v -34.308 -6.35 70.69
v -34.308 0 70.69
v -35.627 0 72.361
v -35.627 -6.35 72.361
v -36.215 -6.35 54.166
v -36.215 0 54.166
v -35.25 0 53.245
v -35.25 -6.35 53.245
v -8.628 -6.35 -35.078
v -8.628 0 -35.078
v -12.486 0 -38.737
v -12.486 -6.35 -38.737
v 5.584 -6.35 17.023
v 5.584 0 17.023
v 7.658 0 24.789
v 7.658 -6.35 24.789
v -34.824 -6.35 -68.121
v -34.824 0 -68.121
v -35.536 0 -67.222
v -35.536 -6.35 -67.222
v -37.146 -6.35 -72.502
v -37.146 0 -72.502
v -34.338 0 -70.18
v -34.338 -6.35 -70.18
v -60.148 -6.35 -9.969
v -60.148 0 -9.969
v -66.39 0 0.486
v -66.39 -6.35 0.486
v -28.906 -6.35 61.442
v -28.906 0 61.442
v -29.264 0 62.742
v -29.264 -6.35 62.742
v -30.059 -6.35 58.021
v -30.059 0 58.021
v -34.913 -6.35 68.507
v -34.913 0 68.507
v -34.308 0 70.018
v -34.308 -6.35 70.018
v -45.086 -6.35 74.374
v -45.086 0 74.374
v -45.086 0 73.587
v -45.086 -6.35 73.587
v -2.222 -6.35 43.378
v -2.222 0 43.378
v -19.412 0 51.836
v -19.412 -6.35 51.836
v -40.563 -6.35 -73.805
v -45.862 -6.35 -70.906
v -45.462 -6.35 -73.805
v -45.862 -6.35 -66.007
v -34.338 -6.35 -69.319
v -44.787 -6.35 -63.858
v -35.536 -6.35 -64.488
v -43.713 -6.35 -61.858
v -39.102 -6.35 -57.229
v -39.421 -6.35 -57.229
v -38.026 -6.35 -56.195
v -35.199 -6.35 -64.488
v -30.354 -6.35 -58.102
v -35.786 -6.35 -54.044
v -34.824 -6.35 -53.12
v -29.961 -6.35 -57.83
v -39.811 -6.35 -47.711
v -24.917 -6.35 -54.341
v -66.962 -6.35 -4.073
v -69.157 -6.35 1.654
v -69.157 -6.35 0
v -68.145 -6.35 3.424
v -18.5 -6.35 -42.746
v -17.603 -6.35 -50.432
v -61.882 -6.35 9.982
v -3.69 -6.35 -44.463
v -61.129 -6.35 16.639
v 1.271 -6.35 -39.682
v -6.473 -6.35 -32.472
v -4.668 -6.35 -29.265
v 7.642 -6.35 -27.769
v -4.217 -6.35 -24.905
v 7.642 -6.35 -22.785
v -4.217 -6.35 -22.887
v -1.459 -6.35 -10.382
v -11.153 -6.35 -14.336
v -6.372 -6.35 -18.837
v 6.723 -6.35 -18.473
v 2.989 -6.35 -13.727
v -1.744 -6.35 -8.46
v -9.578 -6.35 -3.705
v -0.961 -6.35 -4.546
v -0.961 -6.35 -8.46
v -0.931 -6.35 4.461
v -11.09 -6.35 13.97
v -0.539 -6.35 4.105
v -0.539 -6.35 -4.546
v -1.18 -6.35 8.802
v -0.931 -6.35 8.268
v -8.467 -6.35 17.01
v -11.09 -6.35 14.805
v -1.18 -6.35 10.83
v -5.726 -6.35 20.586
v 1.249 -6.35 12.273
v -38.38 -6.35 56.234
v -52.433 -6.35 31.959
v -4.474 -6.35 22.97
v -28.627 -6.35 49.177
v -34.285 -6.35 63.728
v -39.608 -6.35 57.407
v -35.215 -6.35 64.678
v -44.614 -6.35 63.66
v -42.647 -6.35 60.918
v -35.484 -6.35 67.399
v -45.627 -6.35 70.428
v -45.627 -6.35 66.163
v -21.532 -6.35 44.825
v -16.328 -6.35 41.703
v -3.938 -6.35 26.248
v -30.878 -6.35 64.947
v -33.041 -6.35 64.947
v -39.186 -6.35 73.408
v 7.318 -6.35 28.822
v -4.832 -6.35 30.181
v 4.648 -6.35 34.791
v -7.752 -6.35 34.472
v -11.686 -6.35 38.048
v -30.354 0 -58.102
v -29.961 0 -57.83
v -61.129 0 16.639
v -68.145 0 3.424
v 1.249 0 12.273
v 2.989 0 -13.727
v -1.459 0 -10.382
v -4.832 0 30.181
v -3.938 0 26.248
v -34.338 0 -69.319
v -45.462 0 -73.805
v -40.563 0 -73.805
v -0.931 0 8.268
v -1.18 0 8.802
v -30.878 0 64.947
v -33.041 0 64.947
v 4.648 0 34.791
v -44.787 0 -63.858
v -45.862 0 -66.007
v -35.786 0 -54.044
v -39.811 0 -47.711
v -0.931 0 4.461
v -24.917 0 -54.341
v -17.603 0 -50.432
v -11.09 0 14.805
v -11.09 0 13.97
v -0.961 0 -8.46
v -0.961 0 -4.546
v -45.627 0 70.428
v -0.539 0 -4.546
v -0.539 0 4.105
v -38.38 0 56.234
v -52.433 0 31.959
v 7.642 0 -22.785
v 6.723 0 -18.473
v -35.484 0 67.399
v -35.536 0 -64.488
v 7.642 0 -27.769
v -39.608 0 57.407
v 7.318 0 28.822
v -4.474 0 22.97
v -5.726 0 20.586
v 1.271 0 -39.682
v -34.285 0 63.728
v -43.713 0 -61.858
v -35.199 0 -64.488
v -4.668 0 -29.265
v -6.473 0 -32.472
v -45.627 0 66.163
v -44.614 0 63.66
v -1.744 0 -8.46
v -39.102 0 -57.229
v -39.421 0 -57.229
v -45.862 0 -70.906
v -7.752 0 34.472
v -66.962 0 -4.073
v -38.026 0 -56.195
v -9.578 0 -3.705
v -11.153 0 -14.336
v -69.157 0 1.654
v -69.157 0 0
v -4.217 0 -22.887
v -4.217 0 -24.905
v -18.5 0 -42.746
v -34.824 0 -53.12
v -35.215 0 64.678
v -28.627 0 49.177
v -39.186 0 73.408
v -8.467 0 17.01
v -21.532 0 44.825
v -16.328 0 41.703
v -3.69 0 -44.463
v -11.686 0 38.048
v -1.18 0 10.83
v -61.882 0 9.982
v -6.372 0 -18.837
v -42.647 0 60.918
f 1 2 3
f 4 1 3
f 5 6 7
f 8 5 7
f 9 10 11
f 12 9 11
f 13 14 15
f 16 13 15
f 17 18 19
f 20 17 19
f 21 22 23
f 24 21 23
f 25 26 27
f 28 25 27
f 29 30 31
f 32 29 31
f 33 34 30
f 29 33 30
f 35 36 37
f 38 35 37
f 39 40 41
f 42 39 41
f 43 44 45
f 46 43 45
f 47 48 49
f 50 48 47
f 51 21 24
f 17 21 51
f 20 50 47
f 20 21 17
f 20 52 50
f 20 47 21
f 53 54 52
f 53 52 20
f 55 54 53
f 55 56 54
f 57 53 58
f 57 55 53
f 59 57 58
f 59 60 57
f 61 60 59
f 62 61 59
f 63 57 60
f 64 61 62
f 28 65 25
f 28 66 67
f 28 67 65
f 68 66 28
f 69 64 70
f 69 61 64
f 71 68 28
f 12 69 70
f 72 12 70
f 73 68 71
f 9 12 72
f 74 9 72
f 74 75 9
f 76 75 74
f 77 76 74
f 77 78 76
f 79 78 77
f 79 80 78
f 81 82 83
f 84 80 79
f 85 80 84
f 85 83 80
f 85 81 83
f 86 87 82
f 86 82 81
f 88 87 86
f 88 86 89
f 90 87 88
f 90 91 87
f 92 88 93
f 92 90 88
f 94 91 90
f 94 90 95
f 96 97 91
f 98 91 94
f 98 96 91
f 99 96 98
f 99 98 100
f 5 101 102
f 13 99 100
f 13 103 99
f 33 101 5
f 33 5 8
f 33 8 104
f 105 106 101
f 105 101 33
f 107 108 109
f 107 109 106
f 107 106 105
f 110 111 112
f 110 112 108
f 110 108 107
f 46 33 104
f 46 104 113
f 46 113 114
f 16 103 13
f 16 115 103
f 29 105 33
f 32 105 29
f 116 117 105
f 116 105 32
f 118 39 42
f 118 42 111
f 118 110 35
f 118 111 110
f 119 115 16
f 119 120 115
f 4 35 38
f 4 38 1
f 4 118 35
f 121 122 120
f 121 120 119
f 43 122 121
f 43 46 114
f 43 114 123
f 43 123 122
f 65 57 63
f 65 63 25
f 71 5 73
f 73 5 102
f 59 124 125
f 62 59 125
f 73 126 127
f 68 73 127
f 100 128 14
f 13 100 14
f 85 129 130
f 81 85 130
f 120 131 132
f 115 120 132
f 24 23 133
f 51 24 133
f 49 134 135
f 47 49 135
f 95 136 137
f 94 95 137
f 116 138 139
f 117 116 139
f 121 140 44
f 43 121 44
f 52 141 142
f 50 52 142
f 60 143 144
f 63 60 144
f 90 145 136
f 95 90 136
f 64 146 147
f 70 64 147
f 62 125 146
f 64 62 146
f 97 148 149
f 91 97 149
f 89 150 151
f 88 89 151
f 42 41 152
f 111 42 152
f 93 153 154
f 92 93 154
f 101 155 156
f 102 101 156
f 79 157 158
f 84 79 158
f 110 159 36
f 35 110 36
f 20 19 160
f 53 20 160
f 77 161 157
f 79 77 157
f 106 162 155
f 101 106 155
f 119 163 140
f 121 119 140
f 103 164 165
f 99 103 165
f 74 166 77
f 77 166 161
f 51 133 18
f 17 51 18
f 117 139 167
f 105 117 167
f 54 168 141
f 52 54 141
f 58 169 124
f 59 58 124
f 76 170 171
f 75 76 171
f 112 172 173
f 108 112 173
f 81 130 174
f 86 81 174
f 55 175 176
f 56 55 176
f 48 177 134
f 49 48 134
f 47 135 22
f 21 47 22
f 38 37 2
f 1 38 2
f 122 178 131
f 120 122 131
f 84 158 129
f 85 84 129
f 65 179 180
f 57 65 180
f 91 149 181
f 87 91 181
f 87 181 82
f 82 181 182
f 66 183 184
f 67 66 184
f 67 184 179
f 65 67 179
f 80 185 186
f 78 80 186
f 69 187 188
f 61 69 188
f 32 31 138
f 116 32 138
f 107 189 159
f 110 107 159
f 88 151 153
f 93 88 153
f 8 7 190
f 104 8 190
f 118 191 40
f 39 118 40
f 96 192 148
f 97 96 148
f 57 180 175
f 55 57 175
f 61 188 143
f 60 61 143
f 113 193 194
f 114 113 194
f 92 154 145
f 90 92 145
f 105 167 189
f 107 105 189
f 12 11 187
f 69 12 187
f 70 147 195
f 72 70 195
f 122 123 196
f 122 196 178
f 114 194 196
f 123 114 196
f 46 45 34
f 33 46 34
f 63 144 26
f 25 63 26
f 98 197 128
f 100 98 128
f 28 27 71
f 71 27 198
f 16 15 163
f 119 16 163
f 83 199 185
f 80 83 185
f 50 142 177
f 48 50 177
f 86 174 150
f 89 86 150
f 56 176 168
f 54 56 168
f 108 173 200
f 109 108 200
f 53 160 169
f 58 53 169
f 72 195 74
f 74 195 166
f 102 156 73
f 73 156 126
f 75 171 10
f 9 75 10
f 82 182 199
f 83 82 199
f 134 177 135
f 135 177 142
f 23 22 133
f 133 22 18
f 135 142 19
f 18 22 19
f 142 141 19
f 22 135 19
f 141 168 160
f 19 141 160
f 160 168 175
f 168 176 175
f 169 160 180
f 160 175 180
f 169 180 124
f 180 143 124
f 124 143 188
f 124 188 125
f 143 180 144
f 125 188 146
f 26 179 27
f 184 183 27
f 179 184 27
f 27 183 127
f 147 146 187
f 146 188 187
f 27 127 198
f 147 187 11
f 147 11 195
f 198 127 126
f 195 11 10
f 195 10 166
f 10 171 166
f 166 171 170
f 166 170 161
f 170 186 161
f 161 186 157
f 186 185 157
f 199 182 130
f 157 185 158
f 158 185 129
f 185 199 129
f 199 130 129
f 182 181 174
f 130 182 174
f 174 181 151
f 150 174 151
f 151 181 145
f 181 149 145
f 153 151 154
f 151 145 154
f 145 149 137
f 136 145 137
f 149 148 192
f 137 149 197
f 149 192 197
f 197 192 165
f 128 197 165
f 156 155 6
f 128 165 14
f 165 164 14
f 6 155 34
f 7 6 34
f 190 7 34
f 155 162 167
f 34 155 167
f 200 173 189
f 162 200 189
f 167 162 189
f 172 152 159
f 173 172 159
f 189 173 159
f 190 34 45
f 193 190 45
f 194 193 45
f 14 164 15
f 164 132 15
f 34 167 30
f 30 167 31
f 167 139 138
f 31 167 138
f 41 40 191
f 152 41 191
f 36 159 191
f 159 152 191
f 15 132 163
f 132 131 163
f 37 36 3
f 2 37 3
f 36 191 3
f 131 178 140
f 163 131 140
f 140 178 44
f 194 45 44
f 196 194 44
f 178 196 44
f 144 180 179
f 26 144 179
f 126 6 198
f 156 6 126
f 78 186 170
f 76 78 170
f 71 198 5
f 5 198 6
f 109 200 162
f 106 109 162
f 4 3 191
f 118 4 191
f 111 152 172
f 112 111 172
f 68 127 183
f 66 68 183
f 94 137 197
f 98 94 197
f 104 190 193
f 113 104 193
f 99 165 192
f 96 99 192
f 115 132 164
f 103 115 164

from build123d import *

# Parameters (mm, degrees)
F1_DEPTH = 6.35


with BuildPart() as f1:
    # F0 (on Front) → F1 (new body)
    with BuildSketch(Plane.XZ):
        Polygon((-34.308497, 70.690155), (-35.627097, 72.361246), (-39.185513, 73.408395), (-45.085765, 74.37408), (-45.085765, 73.587187), (-45.627236, 70.428468), (-45.627236, 66.162765), (-44.614065, 63.659623), (-42.647313, 60.918093), (-39.607789, 57.407359), (-38.379731, 56.234379), (-52.432694, 31.958599), (-61.129313, 16.639169), (-68.144596, 3.424435), (-69.156672, 1.654225), (-69.156672, 0), (-66.961855, -4.073157), (-38.026095, -56.195294), (-39.102234, -57.228971), (-39.421171, -57.228971), (-43.712616, -61.858468), (-44.787329, -63.857928), (-45.862038, -66.007353), (-45.862038, -70.906028), (-45.462146, -73.80525), (-40.563464, -73.80525), (-37.146181, -72.502002), (-34.33761, -70.180252), (-34.33761, -69.318958), (-34.824431, -68.120629), (-35.535935, -67.221887), (-35.535935, -64.488217), (-35.198905, -64.488217), (-30.354133, -58.102311), (-29.960589, -57.83011), (-24.916569, -54.341327), (-17.60274, -50.432213), (-3.689651, -44.463456), (1.271262, -39.682169), (7.641939, -27.768502), (7.641939, -22.784742), (6.722947, -18.47255), (2.988683, -13.726575), (-1.459086, -10.381853), (-1.743743, -8.460417), (-0.960936, -8.460417), (-0.960936, -4.546382), (-0.539417, -4.546382), (-0.539417, -3.977067), (-0.539417, 4.104951), (-0.930821, 4.460773), (-0.930821, 8.268063), (-1.179896, 8.801795), (-1.179896, 10.829977), (1.248935, 12.272857), (5.584201, 17.022802), (7.657589, 24.788585), (7.318308, 28.822267), (4.647506, 34.791052), (-2.222107, 43.378066), (-19.41184, 51.835634), (-30.058911, 58.020536), (-28.905725, 61.441984), (-29.26437, 62.742077), (-30.878276, 64.946632), (-33.040687, 64.946632), (-34.285408, 63.728355), (-35.215292, 64.678423), (-35.483975, 67.398816), (-34.913026, 68.507127), (-34.308497, 70.018455), align=None)
        Polygon((-18.50041, -42.745914), (-34.824431, -53.119961), (-35.786382, -54.043956), (-39.810754, -47.711428), (-60.148131, -9.969187), (-66.390261, 0.486024), (-61.881507, 9.981615), (-36.214546, 54.166303), (-35.249628, 53.244662), (-28.627157, 49.176574), (-21.531653, 44.824664), (-16.328281, 41.702639), (-11.685591, 38.048264), (-7.752089, 34.472354), (-4.831761, 30.181259), (-3.937784, 26.247757), (-4.474171, 22.969838), (-5.72574, 20.585898), (-8.467271, 17.009988), (-11.089605, 14.804843), (-11.089605, 13.970464), (-9.57832, -3.704541), (-11.153418, -14.336454), (-6.371869, -18.836735), (-4.217299, -22.886988), (-4.217299, -24.904553), (-4.668344, -29.264662), (-6.472527, -32.472096), (-8.627522, -35.078138), (-12.486468, -38.736619), align=None, mode=Mode.SUBTRACT)
    extrude(amount=F1_DEPTH)


solid = f1.part
